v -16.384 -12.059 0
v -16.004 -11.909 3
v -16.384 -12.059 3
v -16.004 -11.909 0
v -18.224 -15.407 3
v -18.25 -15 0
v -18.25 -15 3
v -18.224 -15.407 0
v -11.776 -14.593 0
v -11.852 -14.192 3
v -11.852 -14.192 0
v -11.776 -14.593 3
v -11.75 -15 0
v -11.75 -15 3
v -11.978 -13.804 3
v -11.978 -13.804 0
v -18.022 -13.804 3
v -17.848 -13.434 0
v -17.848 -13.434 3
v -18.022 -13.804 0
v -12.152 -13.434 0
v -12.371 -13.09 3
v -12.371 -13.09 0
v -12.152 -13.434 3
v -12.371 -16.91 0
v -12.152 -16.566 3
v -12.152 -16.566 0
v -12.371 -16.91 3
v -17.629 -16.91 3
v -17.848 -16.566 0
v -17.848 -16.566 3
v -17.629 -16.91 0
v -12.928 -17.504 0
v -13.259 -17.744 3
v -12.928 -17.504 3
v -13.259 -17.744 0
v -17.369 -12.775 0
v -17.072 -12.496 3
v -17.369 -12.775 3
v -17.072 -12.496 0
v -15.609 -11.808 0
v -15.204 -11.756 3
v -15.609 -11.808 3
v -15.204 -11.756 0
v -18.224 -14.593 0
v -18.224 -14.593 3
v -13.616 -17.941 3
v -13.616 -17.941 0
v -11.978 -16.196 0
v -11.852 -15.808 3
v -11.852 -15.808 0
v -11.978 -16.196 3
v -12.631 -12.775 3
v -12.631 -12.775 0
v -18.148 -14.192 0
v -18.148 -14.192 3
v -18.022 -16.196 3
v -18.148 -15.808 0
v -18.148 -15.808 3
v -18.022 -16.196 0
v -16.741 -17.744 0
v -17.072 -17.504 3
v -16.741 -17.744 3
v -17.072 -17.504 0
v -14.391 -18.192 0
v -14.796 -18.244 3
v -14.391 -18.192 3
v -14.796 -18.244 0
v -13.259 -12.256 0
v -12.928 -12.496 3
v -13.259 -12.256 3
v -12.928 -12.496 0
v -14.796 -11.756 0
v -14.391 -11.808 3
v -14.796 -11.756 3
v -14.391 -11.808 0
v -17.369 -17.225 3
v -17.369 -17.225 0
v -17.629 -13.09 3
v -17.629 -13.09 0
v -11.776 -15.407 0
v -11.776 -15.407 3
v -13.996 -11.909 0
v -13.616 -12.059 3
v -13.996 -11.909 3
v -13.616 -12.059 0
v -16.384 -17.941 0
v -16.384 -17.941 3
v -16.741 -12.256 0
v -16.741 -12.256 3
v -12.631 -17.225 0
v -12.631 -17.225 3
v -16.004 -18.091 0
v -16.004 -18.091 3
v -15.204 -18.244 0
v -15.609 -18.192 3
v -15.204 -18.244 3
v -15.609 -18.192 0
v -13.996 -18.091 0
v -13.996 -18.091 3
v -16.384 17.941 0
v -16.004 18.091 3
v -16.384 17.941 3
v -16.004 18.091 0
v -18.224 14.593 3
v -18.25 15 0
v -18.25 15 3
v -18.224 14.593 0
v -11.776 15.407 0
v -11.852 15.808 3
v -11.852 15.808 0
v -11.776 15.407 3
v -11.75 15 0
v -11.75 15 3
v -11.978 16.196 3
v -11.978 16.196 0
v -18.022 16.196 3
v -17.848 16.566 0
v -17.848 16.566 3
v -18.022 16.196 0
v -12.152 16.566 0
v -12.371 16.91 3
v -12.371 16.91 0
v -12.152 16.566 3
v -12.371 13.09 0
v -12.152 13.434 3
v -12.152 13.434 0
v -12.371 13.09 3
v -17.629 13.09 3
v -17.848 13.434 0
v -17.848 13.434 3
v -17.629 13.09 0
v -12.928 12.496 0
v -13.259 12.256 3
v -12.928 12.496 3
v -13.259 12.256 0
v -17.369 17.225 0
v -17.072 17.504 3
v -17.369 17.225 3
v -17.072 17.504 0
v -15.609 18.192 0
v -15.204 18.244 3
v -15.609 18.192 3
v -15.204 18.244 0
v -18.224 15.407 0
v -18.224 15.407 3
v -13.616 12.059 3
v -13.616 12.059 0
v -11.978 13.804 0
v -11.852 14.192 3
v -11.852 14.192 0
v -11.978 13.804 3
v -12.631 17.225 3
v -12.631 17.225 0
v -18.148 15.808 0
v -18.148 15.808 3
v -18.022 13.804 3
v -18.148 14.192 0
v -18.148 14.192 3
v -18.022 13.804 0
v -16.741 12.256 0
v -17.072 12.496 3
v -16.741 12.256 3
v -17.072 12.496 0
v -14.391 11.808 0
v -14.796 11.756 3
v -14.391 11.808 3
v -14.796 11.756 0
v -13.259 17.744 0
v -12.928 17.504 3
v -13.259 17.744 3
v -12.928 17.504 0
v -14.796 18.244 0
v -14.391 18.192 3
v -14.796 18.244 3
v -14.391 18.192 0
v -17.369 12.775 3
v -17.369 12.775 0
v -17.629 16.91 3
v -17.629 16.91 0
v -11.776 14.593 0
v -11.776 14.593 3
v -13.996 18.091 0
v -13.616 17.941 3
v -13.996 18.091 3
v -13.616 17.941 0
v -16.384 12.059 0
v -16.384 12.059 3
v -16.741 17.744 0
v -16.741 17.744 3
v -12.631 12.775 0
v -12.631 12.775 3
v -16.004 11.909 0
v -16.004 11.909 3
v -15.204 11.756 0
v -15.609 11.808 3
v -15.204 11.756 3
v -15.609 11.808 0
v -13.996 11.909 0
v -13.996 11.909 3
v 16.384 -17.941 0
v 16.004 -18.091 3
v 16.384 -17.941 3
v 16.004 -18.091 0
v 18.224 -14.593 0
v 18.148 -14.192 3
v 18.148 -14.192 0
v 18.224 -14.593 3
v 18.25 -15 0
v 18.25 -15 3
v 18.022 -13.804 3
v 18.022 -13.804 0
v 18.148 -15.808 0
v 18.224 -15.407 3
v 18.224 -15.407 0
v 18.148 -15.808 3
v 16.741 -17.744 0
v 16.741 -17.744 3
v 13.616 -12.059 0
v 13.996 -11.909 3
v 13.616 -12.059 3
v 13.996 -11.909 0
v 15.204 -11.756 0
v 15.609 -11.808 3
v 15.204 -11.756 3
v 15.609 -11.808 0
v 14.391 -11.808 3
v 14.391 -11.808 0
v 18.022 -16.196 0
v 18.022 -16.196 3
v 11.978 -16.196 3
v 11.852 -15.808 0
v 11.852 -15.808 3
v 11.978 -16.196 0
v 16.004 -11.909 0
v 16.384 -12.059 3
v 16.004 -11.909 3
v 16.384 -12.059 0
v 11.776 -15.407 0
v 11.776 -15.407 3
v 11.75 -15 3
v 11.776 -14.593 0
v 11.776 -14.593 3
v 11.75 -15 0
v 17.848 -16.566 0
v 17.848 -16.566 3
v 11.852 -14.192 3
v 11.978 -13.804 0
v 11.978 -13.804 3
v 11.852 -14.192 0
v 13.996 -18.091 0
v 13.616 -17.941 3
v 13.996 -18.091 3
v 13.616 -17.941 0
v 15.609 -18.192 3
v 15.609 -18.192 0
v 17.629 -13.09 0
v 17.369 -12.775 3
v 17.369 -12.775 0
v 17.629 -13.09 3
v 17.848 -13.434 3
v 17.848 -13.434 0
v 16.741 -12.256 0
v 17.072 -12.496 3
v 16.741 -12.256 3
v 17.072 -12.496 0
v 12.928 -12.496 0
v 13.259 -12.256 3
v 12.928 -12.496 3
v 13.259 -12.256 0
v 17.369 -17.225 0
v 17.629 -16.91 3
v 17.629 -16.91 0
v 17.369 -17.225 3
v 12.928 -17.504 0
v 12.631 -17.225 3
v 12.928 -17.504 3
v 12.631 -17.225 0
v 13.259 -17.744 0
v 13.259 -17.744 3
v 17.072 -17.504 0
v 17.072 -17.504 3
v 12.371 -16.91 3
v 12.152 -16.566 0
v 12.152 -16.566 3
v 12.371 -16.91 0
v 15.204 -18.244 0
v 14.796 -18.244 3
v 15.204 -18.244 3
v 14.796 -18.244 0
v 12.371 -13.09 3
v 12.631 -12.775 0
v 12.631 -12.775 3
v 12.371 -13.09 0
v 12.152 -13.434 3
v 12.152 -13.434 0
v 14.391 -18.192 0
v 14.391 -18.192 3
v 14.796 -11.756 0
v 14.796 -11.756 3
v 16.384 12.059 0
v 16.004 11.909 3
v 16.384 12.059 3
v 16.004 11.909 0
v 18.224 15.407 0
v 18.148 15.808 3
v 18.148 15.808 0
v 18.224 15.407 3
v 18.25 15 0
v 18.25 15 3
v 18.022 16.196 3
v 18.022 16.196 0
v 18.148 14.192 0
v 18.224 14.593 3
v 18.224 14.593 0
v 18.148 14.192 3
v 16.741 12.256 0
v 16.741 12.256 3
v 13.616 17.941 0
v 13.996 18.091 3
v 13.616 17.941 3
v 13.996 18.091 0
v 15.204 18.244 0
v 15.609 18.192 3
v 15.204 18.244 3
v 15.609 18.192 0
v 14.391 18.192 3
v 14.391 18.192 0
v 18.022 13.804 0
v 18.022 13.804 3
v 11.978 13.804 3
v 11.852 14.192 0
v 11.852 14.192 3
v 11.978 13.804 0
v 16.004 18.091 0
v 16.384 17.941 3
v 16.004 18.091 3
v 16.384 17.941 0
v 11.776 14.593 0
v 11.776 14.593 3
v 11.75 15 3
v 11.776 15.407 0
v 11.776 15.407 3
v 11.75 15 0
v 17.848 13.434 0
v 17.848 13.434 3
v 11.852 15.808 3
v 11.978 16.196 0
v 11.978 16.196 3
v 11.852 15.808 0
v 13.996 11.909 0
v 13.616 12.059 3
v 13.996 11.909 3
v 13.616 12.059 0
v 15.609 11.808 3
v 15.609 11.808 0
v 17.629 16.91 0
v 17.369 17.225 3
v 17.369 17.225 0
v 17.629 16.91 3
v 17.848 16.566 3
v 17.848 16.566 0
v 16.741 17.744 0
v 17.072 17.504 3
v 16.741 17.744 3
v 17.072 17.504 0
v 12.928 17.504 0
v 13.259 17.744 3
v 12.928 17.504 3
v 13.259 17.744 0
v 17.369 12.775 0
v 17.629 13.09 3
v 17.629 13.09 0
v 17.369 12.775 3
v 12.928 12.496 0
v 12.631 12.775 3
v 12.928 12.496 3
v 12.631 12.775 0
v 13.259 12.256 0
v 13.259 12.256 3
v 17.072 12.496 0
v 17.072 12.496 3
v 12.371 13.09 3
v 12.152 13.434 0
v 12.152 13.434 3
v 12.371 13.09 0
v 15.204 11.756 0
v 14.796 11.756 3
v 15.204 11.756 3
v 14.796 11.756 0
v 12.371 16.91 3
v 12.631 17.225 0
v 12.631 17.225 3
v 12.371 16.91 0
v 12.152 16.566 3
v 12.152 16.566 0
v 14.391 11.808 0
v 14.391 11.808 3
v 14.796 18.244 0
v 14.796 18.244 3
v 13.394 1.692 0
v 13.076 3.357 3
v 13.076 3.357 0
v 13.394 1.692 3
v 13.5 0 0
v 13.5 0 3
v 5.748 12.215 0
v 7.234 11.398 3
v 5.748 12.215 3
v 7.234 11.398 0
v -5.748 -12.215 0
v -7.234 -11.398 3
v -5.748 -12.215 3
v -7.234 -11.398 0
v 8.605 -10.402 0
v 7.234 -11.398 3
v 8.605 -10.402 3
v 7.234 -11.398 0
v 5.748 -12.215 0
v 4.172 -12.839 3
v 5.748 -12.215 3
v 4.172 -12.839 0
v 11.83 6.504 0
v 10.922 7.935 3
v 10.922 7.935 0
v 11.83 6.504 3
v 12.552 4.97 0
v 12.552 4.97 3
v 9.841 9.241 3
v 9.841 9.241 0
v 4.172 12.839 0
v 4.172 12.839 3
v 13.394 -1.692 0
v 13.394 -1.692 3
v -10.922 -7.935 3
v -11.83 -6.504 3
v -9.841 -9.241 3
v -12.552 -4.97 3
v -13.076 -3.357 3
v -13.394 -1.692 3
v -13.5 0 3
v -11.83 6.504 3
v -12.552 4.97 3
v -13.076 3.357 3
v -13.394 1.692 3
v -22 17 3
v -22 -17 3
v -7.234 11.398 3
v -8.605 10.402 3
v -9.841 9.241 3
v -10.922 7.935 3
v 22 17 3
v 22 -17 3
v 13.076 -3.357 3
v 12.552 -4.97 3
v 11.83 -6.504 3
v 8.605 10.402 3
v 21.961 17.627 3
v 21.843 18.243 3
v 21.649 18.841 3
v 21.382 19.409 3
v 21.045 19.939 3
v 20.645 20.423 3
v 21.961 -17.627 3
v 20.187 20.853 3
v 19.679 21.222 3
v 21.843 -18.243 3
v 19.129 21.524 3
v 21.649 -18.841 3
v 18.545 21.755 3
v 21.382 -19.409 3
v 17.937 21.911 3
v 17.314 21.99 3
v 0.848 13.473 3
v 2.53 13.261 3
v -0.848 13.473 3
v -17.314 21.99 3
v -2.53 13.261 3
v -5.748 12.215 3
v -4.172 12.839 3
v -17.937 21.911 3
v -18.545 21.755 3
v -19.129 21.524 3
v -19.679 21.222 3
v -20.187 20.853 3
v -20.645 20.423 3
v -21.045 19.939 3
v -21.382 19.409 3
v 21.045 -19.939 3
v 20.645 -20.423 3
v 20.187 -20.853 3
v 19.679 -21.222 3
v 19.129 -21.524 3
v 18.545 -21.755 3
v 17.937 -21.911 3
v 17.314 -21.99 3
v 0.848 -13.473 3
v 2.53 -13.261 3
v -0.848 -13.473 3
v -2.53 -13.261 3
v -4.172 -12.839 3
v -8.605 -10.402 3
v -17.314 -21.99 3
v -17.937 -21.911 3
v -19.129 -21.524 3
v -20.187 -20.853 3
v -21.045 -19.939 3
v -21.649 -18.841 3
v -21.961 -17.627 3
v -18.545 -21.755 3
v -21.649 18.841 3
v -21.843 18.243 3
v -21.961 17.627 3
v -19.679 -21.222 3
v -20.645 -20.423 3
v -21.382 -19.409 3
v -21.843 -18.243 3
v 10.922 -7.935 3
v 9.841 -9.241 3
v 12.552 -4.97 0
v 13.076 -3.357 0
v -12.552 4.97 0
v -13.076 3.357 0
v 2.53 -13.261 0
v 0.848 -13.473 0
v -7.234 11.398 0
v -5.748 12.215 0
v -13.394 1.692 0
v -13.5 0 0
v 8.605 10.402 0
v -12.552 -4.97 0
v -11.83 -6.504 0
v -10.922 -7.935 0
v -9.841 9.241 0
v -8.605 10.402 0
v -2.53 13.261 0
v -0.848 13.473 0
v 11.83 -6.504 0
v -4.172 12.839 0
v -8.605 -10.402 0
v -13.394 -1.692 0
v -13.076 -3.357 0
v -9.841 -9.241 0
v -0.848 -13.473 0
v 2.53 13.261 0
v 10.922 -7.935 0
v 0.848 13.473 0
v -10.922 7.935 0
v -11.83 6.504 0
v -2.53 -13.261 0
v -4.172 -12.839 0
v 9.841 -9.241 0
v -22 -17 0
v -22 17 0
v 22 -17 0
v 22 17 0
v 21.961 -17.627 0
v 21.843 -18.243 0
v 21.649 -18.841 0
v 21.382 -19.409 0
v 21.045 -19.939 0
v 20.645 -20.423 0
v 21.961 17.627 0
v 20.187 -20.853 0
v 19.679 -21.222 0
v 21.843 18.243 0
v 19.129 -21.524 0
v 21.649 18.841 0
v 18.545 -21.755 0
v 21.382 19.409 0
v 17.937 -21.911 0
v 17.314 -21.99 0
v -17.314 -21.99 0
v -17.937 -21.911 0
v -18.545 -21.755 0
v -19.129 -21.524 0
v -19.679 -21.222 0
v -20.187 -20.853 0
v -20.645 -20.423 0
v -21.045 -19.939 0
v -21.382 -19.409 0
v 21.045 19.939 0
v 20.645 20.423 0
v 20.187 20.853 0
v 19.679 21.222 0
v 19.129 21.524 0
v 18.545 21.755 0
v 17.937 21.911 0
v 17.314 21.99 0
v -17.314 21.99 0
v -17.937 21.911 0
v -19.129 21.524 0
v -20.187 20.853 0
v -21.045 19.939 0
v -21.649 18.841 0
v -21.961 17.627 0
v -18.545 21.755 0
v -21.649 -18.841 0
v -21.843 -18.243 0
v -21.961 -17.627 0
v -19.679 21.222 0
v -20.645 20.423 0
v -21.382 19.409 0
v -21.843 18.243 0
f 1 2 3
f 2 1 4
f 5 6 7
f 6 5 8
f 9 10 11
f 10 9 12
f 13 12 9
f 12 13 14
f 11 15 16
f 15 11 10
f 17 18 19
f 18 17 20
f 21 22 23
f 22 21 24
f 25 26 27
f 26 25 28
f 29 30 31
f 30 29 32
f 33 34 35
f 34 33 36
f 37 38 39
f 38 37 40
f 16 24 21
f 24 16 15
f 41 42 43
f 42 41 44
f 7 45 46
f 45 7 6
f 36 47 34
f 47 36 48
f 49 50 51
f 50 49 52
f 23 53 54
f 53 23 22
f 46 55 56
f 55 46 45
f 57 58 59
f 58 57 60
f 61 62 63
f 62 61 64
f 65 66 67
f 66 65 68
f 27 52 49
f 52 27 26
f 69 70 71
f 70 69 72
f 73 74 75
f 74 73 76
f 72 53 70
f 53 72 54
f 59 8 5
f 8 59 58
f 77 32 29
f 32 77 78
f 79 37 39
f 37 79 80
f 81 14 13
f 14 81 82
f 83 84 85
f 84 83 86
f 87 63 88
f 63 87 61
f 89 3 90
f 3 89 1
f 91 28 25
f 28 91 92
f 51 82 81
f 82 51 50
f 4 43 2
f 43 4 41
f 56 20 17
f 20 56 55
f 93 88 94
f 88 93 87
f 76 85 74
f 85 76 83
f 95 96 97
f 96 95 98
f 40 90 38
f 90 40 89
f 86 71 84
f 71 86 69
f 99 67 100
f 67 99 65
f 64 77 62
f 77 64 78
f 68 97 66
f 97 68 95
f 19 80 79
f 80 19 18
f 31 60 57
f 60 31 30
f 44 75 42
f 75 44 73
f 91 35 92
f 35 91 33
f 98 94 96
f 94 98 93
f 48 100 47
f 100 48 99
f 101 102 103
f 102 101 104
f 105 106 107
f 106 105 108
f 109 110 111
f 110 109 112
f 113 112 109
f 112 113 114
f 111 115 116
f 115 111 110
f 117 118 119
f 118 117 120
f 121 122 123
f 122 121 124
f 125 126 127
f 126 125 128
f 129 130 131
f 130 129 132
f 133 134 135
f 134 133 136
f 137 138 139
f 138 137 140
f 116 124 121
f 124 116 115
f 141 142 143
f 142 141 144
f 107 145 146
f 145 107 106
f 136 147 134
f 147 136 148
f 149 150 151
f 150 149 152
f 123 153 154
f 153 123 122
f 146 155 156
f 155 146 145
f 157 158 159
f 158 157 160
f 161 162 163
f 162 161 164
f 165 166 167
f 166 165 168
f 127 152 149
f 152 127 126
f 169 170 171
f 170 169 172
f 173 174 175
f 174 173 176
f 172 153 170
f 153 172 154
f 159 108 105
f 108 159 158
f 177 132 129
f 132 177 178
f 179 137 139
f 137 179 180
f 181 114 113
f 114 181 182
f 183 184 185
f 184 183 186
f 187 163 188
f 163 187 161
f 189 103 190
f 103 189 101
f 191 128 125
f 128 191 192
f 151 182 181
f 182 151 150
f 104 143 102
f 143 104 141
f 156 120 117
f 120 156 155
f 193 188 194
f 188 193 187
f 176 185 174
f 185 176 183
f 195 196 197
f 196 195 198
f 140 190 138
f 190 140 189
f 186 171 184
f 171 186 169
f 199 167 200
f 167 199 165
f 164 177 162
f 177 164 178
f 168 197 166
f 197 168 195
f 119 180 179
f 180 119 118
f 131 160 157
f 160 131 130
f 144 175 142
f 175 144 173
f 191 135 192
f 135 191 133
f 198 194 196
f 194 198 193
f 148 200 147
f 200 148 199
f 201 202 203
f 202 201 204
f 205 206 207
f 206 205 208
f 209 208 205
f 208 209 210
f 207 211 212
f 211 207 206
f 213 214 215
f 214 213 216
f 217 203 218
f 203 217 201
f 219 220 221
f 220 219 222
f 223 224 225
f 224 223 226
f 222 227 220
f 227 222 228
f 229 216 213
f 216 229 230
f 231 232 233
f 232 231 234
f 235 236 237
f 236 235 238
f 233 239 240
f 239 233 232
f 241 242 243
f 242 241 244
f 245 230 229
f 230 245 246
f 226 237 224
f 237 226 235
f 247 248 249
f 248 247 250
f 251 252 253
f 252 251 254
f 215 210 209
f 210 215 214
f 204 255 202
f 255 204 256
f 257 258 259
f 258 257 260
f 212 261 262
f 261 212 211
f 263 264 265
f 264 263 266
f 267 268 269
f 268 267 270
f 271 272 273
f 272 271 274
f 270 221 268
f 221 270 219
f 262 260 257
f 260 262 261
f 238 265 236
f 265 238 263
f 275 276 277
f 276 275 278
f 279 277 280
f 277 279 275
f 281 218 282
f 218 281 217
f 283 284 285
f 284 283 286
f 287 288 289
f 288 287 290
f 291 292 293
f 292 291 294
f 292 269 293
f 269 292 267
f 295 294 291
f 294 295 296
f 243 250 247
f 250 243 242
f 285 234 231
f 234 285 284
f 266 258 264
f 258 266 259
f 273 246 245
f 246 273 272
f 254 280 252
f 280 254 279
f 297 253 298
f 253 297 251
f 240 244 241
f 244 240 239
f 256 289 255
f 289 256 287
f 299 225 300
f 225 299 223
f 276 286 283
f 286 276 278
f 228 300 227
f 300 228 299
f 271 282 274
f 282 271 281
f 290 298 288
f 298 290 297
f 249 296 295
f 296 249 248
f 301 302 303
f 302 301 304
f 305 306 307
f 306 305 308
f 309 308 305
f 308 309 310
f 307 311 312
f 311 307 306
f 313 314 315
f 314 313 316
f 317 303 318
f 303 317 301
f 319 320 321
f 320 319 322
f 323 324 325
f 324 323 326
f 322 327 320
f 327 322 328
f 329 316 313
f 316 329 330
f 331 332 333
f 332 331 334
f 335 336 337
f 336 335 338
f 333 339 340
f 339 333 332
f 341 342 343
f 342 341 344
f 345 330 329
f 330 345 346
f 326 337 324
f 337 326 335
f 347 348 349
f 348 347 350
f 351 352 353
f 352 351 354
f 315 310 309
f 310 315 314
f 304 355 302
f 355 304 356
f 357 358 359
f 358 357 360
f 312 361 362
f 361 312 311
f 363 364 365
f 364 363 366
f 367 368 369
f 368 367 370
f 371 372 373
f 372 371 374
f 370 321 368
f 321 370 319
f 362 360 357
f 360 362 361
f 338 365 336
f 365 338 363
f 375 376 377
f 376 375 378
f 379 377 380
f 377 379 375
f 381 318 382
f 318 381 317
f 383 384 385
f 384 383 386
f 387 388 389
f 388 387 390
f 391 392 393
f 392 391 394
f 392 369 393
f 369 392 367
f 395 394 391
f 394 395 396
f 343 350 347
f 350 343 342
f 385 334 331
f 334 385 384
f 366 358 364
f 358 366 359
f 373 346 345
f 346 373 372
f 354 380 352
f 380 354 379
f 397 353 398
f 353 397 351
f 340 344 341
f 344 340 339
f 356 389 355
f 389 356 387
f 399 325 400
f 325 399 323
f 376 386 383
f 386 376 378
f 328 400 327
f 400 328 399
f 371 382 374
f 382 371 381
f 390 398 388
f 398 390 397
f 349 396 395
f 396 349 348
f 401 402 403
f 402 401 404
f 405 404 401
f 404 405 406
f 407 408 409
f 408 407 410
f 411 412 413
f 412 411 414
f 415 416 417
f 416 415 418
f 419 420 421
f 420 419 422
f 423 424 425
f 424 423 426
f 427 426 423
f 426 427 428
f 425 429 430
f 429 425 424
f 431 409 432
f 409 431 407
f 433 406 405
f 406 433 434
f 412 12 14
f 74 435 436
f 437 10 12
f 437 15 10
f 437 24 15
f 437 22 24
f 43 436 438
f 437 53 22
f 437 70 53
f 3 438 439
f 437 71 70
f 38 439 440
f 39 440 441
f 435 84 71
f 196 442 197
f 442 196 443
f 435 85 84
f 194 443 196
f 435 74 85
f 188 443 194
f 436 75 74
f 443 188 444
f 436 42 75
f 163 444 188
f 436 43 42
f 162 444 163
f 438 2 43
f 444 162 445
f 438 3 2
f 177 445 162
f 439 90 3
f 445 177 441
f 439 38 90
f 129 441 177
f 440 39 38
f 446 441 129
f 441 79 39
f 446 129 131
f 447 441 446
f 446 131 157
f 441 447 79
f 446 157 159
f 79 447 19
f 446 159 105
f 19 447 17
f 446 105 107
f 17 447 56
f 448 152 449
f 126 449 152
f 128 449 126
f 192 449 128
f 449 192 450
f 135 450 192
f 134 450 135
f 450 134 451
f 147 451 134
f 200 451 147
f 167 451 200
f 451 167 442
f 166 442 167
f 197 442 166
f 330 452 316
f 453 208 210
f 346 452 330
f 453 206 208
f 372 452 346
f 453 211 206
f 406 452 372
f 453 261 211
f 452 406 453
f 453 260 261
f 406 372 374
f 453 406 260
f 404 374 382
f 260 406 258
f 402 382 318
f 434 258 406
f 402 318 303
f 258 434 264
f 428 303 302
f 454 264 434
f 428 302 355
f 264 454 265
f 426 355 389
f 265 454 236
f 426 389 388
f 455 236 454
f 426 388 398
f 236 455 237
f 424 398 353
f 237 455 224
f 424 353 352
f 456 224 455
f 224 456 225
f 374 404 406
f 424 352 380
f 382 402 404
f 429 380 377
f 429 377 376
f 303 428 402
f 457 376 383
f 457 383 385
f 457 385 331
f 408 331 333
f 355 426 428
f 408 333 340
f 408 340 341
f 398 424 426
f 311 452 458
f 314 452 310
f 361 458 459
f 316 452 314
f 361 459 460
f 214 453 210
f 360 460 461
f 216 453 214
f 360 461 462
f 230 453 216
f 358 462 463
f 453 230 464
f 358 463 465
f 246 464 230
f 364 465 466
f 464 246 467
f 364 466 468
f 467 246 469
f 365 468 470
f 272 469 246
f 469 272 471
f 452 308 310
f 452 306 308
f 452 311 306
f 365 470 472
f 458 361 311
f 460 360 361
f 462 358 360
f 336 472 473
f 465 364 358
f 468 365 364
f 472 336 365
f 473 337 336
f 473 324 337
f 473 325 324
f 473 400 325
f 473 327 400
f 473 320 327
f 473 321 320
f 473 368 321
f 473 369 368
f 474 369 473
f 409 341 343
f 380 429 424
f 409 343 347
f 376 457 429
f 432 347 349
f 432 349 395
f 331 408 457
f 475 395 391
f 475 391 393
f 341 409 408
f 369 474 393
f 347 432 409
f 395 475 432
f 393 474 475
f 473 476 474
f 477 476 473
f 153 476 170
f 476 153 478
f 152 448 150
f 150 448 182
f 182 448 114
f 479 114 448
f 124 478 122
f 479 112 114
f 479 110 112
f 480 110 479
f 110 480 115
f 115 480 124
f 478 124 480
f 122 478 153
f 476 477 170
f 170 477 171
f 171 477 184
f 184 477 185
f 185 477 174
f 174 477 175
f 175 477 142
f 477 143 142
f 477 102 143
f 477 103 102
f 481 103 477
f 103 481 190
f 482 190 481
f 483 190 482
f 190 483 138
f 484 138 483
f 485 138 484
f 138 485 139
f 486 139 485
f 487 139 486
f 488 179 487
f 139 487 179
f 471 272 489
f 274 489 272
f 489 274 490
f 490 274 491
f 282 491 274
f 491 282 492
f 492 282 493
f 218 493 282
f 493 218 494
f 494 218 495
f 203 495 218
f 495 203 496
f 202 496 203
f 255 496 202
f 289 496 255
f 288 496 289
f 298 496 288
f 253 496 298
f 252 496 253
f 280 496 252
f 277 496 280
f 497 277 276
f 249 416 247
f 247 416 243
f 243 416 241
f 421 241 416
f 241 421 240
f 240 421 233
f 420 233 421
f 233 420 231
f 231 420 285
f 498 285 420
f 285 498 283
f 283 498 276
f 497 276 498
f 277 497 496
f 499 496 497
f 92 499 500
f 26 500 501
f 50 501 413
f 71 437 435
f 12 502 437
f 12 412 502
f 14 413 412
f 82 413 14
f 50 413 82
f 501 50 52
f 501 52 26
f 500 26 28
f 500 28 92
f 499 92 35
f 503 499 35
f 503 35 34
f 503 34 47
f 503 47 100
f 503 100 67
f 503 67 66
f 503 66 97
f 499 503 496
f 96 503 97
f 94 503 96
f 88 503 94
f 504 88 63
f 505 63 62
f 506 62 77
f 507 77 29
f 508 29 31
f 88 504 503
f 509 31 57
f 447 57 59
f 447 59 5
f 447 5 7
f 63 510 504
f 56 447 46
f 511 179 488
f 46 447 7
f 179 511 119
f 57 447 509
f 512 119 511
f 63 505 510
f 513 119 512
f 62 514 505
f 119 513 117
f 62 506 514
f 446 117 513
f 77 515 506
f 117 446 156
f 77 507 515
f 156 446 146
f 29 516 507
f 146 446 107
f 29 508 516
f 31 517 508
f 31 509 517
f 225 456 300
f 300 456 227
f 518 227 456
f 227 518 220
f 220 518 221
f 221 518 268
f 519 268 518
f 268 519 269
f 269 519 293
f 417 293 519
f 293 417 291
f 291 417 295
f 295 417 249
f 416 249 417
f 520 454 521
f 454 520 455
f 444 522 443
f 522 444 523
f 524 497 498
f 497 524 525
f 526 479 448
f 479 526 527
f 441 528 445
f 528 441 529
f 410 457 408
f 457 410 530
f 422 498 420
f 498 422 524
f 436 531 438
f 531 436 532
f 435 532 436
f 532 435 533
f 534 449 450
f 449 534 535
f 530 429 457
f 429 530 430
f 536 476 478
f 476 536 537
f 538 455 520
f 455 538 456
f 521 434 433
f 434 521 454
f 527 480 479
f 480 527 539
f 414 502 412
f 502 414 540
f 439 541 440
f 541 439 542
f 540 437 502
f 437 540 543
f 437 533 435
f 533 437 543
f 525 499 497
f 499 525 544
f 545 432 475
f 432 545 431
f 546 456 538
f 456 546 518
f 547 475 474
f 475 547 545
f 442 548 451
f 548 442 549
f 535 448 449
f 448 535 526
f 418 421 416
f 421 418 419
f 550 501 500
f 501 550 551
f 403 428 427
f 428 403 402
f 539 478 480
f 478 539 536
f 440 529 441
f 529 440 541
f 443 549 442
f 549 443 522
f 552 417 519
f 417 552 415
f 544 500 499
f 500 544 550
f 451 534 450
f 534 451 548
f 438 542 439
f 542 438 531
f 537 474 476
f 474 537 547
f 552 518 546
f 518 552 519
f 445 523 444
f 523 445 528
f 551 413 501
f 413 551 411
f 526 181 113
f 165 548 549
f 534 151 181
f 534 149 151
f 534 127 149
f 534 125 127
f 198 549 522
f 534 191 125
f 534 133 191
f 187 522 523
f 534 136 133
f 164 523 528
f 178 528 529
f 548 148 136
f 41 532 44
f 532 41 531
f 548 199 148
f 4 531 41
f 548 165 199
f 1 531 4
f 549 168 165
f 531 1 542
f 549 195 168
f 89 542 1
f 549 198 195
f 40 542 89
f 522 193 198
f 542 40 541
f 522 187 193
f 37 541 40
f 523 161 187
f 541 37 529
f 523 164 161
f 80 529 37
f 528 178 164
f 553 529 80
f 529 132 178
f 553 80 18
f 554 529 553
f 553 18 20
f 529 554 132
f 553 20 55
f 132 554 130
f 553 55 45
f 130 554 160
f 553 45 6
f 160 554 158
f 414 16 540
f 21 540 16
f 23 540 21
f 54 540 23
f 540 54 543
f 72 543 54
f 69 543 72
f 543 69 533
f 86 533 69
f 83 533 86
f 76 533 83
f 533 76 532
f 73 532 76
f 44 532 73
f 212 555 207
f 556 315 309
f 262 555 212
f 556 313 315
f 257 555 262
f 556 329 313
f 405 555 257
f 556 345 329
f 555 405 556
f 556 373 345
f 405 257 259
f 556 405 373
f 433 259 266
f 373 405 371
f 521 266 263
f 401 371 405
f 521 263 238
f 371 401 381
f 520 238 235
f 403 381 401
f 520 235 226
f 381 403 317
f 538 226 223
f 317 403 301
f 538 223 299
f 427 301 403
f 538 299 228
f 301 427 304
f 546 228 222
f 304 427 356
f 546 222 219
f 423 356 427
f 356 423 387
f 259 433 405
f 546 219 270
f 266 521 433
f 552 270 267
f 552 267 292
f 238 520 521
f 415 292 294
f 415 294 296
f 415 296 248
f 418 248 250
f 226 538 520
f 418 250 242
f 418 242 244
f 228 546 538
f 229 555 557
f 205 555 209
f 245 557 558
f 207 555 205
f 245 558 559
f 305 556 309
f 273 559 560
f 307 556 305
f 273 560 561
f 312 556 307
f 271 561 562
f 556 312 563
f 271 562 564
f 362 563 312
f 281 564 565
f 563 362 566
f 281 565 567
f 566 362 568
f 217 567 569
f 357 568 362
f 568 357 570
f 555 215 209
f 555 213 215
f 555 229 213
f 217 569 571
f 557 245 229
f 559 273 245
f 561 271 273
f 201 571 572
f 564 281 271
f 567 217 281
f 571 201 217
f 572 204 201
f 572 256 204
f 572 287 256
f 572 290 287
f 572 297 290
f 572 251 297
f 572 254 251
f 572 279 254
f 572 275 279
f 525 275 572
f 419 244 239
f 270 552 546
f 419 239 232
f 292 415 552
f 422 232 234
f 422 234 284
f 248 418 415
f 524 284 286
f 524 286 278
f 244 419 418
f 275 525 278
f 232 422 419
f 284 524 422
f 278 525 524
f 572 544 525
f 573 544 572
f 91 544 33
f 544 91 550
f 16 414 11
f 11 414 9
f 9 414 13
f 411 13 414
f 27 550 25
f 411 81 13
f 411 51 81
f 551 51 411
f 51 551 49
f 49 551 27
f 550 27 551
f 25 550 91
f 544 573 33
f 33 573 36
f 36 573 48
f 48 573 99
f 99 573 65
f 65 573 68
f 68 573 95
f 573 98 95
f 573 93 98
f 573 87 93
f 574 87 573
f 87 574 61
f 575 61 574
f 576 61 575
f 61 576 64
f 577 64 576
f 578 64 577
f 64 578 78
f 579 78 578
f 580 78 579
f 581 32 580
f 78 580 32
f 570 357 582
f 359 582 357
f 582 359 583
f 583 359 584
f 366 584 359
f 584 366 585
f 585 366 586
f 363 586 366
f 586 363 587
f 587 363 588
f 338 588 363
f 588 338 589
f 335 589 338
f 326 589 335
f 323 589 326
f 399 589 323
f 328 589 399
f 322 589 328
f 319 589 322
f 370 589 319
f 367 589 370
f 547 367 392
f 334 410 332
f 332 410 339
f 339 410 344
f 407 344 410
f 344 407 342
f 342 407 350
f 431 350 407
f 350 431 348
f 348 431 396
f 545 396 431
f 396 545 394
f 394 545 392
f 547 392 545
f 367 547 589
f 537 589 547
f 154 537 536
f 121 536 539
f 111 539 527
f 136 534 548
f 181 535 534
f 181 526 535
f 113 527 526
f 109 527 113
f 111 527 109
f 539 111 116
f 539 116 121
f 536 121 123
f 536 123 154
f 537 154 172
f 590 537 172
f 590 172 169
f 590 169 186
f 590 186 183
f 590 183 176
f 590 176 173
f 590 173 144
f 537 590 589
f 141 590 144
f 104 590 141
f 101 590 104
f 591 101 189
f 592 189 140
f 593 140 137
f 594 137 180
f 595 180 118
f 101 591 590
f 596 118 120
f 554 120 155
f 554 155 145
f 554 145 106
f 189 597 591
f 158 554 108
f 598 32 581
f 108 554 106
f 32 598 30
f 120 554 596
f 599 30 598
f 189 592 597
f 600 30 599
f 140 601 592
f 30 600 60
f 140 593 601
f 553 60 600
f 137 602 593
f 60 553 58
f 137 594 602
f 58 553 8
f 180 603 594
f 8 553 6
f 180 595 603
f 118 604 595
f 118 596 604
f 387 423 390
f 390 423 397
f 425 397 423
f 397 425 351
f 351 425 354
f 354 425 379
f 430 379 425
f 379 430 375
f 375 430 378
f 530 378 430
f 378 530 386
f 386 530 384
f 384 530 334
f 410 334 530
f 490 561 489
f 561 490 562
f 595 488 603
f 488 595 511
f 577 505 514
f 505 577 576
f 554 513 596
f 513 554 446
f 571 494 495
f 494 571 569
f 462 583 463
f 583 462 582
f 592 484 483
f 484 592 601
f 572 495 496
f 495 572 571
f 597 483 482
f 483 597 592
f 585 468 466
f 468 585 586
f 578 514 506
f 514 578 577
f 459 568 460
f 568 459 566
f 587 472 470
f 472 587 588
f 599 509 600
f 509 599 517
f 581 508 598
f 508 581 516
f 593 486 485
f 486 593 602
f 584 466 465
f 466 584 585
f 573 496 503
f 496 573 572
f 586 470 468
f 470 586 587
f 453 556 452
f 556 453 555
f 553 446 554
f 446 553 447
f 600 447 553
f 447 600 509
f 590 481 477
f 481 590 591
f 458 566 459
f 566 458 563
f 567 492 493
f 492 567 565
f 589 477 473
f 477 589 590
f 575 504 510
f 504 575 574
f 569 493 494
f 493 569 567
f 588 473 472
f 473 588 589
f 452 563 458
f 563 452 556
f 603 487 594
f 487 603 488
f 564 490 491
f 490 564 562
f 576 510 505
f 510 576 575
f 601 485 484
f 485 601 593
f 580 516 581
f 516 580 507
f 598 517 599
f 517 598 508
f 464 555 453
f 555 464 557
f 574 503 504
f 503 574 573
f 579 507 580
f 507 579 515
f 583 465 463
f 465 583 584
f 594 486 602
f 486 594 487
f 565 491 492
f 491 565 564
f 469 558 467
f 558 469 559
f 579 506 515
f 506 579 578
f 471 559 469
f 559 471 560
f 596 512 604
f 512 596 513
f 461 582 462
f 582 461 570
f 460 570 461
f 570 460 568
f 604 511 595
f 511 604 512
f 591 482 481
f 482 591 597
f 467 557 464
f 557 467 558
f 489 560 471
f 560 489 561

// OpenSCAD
$fn = 50;

difference() {
	union() {
		hull() {
			translate(v = [-17.0, 17.0, 0]) {
				cylinder(h = 3, r = 5);
			}
			translate(v = [17.0, 17.0, 0]) {
				cylinder(h = 3, r = 5);
			}
			translate(v = [-17.0, -17.0, 0]) {
				cylinder(h = 3, r = 5);
			}
			translate(v = [17.0, -17.0, 0]) {
				cylinder(h = 3, r = 5);
			}
		}
	}
	union() {
		translate(v = [-15.0, -15.0, -100.0]) {
			cylinder(h = 200, r = 3.25);
		}
		translate(v = [-15.0, 15.0, -100.0]) {
			cylinder(h = 200, r = 3.25);
		}
		translate(v = [15.0, -15.0, -100.0]) {
			cylinder(h = 200, r = 3.25);
		}
		translate(v = [15.0, 15.0, -100.0]) {
			cylinder(h = 200, r = 3.25);
		}
		translate(v = [-15.0, -15.0, -100.0]) {
			cylinder(h = 200, r = 1.8);
		}
		translate(v = [-15.0, 15.0, -100.0]) {
			cylinder(h = 200, r = 1.8);
		}
		translate(v = [15.0, -15.0, -100.0]) {
			cylinder(h = 200, r = 1.8);
		}
		translate(v = [15.0, 15.0, -100.0]) {
			cylinder(h = 200, r = 1.8);
		}
		cylinder(h = 3, r = 13.5);
	}
}
